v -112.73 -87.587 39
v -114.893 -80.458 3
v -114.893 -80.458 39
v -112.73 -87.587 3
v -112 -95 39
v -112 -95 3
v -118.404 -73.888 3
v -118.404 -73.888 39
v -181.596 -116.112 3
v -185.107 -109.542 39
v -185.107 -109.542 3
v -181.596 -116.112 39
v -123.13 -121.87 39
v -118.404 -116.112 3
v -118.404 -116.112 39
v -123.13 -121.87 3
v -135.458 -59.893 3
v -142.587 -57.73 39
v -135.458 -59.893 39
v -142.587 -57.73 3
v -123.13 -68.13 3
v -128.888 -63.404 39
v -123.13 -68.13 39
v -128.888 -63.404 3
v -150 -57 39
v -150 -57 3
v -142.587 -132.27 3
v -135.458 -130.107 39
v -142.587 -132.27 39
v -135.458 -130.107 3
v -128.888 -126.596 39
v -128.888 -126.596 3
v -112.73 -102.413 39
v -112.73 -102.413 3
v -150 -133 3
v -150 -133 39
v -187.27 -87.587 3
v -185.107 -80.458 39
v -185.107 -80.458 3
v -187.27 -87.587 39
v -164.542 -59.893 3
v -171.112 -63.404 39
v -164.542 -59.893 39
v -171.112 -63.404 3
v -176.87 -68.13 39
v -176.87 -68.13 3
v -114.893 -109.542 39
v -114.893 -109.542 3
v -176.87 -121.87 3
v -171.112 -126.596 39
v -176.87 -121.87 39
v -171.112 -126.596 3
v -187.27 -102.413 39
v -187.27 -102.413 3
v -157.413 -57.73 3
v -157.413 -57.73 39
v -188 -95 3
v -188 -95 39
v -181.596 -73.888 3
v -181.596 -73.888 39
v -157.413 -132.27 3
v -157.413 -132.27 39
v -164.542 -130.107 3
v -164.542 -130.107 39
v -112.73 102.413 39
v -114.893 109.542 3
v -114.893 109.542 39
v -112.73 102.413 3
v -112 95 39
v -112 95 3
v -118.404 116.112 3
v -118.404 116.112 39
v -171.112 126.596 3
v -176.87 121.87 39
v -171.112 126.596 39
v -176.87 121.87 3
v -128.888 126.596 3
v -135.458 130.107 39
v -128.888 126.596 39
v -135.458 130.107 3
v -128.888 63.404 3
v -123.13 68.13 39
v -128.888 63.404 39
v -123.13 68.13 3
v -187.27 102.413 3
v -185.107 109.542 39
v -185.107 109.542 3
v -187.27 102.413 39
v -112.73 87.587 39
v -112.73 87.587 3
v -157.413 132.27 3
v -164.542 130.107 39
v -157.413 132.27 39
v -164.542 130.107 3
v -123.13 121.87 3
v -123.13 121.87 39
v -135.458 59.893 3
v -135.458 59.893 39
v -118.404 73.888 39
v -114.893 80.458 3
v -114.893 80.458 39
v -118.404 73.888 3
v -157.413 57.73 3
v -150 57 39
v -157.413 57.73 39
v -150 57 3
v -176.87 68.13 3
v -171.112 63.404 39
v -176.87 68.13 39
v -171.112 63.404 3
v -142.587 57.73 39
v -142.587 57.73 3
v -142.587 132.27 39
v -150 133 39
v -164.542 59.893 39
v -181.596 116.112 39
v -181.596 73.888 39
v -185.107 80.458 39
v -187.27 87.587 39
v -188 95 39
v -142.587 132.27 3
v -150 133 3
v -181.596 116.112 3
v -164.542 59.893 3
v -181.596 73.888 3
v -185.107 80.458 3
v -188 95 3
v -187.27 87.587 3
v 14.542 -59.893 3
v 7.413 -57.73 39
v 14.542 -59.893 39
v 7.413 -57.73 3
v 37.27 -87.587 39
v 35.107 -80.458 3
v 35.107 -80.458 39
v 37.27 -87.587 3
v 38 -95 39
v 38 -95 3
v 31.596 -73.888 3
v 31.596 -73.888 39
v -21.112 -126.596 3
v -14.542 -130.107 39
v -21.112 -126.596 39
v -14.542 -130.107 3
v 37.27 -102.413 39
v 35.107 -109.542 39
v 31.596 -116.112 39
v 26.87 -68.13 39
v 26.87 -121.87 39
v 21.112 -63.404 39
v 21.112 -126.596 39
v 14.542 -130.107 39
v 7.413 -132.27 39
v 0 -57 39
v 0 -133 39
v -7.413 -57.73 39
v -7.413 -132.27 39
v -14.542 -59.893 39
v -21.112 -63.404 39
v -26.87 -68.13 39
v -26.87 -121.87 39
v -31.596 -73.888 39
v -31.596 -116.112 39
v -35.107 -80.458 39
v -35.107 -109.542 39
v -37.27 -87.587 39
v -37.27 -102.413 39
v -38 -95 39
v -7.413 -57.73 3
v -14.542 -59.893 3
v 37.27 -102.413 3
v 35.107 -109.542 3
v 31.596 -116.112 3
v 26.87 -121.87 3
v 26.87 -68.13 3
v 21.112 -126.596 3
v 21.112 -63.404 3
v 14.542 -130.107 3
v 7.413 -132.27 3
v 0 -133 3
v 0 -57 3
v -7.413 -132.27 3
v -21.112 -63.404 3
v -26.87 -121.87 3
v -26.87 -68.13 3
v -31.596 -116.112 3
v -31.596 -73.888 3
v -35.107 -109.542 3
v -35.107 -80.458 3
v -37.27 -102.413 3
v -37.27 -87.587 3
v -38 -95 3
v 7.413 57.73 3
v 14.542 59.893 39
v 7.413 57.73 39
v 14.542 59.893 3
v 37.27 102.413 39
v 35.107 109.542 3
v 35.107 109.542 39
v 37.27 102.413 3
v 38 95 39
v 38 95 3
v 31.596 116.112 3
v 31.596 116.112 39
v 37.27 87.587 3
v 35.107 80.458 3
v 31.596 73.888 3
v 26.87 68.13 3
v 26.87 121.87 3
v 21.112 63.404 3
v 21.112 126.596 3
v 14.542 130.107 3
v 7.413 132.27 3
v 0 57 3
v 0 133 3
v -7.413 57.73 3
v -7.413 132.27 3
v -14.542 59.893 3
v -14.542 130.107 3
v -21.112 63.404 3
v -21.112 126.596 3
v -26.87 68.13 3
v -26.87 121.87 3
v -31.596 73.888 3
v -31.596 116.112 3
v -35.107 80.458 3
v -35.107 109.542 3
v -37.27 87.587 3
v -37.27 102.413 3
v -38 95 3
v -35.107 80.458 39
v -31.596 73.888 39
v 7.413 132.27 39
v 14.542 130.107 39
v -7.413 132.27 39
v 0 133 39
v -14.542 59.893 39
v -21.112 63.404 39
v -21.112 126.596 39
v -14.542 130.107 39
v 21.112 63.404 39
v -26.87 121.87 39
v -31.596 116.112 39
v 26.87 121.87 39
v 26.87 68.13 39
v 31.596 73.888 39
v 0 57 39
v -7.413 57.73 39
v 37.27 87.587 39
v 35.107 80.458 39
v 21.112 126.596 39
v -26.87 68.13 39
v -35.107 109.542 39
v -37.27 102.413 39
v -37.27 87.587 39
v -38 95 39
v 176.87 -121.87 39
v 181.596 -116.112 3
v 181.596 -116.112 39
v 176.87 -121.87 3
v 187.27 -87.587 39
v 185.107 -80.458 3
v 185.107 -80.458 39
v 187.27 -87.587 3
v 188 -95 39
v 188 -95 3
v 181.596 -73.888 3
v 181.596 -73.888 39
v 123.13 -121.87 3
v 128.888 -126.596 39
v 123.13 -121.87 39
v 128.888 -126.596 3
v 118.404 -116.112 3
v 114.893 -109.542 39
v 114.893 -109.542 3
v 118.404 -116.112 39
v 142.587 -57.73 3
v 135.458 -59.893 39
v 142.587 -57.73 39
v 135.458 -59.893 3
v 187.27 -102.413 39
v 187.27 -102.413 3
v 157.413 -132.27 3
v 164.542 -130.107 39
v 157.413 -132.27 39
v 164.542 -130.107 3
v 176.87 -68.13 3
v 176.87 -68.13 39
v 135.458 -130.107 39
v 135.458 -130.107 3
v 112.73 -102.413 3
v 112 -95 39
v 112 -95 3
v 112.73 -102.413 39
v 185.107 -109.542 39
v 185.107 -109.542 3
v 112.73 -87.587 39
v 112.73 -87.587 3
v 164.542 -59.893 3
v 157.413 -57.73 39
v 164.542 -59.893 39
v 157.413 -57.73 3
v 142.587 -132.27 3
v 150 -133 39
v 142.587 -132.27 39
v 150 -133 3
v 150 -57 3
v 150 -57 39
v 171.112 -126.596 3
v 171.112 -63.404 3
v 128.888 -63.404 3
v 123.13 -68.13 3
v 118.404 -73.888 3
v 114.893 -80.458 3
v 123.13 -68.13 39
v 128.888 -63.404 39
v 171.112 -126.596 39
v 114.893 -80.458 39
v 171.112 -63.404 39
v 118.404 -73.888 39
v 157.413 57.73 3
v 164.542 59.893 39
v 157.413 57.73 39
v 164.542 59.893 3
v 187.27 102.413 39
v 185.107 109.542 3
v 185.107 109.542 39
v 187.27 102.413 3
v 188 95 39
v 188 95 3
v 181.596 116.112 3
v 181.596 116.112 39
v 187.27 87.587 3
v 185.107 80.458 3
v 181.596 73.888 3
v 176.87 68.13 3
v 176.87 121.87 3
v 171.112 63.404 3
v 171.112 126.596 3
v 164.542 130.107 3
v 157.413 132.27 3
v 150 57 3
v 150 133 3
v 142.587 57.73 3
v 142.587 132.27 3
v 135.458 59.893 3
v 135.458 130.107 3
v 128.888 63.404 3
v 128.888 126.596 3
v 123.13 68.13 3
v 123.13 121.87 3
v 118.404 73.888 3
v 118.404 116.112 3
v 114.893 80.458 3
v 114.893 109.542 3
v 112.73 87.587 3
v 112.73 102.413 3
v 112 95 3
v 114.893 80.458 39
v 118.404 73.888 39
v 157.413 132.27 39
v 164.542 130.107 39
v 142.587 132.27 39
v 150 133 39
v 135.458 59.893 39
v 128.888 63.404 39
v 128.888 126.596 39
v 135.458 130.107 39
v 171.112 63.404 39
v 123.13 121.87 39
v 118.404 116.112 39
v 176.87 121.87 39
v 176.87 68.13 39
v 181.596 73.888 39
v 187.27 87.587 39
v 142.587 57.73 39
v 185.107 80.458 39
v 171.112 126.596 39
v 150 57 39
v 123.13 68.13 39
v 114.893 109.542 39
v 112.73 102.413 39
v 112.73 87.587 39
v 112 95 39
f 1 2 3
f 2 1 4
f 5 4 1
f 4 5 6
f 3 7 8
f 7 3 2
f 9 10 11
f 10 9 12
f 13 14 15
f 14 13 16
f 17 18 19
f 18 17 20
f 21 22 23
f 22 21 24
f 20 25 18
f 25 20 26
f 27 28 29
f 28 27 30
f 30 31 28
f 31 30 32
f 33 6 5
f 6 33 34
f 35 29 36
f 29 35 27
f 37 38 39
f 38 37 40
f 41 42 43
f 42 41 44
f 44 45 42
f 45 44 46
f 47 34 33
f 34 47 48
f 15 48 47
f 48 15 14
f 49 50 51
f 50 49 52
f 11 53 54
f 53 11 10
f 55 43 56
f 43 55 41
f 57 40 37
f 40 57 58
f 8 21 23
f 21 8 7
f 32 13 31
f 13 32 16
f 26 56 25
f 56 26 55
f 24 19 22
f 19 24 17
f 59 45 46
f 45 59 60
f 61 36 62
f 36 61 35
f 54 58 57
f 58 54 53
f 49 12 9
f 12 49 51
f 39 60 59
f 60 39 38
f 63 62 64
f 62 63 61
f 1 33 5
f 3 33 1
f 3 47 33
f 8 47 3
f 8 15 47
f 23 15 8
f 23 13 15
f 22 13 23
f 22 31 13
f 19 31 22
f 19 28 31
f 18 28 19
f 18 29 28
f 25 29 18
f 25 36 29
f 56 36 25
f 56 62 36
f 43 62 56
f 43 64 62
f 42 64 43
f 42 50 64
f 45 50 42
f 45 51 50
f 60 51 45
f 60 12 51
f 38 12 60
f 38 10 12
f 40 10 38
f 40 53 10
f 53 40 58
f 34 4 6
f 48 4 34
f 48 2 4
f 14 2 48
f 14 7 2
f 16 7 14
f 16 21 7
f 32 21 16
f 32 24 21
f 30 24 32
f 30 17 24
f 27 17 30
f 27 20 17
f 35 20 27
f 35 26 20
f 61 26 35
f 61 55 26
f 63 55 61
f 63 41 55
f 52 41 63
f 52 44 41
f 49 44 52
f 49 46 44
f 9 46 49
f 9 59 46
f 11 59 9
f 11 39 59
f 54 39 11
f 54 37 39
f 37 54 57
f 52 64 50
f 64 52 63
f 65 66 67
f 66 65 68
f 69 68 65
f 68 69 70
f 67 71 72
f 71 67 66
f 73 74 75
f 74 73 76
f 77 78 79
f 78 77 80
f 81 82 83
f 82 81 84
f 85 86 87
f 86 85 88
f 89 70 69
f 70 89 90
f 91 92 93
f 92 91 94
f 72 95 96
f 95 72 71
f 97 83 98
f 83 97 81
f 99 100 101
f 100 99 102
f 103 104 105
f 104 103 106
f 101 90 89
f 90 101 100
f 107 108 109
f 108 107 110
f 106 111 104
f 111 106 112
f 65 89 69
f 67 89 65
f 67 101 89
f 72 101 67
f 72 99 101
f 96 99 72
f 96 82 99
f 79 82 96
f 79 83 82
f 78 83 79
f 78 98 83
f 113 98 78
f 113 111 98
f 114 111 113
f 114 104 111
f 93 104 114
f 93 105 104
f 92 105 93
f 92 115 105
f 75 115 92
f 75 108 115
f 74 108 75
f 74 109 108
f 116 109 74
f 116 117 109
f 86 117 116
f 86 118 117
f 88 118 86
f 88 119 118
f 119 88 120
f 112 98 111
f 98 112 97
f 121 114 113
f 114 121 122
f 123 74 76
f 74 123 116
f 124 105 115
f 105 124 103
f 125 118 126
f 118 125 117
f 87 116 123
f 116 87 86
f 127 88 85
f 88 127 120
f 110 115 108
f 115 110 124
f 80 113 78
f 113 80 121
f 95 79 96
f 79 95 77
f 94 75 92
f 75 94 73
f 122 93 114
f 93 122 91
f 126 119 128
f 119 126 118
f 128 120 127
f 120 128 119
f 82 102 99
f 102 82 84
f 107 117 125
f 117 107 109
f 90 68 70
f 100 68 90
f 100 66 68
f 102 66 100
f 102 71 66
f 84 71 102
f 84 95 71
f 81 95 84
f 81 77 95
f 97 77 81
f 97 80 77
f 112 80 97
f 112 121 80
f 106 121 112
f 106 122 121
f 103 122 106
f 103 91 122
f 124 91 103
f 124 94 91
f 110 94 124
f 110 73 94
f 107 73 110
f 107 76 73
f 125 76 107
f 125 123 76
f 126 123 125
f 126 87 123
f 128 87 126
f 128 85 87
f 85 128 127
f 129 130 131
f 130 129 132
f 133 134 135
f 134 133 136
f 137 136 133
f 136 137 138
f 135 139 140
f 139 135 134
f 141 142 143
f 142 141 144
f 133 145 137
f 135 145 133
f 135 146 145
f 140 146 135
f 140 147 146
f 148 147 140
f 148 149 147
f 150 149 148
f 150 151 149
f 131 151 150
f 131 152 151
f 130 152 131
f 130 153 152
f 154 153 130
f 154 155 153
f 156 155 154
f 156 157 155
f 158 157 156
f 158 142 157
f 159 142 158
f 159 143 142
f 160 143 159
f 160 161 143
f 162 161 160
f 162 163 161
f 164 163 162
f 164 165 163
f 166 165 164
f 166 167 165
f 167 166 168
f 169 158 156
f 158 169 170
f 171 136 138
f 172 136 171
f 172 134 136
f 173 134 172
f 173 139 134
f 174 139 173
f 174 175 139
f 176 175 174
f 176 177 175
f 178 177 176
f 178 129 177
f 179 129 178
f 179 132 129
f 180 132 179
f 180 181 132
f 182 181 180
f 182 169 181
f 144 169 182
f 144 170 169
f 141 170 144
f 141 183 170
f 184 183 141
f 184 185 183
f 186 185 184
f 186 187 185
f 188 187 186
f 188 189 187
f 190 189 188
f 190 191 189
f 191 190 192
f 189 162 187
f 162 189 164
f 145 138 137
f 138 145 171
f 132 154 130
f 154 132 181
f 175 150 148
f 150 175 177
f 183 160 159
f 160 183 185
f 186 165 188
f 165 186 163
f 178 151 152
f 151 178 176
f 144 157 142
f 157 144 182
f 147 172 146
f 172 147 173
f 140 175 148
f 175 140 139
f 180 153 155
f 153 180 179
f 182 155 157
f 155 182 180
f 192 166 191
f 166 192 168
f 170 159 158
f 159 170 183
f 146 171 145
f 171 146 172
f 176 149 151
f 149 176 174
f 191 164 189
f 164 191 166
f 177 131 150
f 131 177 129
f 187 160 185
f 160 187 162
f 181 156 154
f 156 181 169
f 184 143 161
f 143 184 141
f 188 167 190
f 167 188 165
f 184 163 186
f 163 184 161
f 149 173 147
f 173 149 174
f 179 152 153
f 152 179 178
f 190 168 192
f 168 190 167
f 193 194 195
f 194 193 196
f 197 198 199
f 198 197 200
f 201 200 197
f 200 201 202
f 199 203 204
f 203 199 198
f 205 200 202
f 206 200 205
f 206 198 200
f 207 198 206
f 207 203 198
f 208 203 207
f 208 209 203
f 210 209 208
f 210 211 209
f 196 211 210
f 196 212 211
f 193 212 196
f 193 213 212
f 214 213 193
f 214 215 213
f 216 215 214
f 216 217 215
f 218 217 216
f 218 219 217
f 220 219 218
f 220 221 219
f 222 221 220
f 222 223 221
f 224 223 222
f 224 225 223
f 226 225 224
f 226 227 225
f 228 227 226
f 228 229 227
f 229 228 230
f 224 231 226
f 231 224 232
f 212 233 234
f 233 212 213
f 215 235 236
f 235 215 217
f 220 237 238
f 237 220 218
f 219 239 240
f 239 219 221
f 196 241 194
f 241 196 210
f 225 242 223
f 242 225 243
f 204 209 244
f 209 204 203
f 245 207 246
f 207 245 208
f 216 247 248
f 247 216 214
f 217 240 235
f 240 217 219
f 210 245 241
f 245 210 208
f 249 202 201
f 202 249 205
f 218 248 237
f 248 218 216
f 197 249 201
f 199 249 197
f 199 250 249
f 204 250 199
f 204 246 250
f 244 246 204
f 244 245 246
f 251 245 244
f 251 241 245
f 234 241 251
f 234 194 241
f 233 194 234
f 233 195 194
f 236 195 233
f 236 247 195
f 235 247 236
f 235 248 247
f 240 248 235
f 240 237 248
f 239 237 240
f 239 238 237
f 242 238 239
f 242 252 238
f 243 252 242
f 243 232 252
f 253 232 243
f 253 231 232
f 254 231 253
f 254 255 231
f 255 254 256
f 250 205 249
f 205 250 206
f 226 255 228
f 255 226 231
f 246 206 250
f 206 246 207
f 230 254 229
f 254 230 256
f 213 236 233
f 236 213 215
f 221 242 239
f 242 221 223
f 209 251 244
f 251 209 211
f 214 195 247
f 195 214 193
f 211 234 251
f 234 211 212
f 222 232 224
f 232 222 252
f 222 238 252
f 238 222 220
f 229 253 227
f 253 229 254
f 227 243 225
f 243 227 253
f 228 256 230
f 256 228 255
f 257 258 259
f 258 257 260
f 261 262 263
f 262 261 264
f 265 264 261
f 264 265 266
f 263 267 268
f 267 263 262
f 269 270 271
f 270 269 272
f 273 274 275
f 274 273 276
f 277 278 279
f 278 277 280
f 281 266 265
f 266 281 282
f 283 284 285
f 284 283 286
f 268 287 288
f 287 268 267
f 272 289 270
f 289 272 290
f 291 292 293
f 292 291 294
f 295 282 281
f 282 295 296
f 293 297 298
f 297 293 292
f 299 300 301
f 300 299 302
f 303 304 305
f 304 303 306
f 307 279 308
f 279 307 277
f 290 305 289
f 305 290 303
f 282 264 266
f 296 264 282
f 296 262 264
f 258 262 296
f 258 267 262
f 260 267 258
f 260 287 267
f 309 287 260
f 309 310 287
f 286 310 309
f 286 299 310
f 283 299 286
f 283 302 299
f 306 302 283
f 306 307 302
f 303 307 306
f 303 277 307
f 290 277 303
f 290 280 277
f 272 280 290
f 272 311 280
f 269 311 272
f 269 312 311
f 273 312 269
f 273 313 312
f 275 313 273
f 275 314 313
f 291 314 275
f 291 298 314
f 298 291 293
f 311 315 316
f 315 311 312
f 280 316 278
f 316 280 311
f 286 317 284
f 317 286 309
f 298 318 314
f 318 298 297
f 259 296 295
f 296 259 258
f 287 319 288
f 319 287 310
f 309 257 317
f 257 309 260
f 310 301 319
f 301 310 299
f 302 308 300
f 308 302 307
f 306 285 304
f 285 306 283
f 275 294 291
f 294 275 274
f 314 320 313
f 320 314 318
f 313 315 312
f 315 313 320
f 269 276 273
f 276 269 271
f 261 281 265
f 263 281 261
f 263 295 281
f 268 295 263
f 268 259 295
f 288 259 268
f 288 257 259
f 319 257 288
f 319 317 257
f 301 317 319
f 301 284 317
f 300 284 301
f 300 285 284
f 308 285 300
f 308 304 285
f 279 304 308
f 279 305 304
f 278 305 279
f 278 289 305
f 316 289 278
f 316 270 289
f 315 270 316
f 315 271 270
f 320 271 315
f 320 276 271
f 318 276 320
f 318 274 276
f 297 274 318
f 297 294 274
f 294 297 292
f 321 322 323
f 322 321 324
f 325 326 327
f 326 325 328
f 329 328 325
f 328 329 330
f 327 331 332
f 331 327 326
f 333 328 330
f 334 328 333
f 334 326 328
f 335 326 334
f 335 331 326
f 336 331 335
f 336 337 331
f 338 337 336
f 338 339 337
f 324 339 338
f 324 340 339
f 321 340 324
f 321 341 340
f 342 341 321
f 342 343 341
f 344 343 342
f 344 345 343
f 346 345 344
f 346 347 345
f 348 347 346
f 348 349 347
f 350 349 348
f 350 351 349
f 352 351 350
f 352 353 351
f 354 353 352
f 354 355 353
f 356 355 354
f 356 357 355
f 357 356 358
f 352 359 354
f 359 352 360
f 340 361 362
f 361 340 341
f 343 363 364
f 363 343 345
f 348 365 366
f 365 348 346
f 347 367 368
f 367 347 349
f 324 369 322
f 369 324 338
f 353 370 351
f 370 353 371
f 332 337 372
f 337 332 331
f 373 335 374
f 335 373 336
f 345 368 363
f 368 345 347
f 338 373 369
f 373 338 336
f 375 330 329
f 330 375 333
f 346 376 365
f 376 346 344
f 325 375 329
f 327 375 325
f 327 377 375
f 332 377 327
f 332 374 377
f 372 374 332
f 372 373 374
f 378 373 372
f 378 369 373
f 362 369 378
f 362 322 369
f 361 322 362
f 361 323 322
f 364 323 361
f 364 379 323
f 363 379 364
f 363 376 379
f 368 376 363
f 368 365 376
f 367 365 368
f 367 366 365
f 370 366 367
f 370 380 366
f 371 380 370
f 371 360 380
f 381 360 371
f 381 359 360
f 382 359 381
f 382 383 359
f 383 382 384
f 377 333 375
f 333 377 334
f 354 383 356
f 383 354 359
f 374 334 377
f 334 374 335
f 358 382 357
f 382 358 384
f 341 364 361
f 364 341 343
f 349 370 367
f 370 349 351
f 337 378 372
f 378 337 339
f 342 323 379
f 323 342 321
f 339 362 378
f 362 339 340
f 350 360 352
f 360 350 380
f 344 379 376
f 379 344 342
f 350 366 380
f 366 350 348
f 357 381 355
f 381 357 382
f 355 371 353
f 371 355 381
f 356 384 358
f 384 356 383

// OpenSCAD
use <main.scad>
lift_center_x         = -15;
lift_lowered_deck_z   = 330;
payload_box_height    = 50;
show_component_labels = false;
translate([-lift_center_x, 0, -(lift_lowered_deck_z + 2)])
    payload_weights(0);
